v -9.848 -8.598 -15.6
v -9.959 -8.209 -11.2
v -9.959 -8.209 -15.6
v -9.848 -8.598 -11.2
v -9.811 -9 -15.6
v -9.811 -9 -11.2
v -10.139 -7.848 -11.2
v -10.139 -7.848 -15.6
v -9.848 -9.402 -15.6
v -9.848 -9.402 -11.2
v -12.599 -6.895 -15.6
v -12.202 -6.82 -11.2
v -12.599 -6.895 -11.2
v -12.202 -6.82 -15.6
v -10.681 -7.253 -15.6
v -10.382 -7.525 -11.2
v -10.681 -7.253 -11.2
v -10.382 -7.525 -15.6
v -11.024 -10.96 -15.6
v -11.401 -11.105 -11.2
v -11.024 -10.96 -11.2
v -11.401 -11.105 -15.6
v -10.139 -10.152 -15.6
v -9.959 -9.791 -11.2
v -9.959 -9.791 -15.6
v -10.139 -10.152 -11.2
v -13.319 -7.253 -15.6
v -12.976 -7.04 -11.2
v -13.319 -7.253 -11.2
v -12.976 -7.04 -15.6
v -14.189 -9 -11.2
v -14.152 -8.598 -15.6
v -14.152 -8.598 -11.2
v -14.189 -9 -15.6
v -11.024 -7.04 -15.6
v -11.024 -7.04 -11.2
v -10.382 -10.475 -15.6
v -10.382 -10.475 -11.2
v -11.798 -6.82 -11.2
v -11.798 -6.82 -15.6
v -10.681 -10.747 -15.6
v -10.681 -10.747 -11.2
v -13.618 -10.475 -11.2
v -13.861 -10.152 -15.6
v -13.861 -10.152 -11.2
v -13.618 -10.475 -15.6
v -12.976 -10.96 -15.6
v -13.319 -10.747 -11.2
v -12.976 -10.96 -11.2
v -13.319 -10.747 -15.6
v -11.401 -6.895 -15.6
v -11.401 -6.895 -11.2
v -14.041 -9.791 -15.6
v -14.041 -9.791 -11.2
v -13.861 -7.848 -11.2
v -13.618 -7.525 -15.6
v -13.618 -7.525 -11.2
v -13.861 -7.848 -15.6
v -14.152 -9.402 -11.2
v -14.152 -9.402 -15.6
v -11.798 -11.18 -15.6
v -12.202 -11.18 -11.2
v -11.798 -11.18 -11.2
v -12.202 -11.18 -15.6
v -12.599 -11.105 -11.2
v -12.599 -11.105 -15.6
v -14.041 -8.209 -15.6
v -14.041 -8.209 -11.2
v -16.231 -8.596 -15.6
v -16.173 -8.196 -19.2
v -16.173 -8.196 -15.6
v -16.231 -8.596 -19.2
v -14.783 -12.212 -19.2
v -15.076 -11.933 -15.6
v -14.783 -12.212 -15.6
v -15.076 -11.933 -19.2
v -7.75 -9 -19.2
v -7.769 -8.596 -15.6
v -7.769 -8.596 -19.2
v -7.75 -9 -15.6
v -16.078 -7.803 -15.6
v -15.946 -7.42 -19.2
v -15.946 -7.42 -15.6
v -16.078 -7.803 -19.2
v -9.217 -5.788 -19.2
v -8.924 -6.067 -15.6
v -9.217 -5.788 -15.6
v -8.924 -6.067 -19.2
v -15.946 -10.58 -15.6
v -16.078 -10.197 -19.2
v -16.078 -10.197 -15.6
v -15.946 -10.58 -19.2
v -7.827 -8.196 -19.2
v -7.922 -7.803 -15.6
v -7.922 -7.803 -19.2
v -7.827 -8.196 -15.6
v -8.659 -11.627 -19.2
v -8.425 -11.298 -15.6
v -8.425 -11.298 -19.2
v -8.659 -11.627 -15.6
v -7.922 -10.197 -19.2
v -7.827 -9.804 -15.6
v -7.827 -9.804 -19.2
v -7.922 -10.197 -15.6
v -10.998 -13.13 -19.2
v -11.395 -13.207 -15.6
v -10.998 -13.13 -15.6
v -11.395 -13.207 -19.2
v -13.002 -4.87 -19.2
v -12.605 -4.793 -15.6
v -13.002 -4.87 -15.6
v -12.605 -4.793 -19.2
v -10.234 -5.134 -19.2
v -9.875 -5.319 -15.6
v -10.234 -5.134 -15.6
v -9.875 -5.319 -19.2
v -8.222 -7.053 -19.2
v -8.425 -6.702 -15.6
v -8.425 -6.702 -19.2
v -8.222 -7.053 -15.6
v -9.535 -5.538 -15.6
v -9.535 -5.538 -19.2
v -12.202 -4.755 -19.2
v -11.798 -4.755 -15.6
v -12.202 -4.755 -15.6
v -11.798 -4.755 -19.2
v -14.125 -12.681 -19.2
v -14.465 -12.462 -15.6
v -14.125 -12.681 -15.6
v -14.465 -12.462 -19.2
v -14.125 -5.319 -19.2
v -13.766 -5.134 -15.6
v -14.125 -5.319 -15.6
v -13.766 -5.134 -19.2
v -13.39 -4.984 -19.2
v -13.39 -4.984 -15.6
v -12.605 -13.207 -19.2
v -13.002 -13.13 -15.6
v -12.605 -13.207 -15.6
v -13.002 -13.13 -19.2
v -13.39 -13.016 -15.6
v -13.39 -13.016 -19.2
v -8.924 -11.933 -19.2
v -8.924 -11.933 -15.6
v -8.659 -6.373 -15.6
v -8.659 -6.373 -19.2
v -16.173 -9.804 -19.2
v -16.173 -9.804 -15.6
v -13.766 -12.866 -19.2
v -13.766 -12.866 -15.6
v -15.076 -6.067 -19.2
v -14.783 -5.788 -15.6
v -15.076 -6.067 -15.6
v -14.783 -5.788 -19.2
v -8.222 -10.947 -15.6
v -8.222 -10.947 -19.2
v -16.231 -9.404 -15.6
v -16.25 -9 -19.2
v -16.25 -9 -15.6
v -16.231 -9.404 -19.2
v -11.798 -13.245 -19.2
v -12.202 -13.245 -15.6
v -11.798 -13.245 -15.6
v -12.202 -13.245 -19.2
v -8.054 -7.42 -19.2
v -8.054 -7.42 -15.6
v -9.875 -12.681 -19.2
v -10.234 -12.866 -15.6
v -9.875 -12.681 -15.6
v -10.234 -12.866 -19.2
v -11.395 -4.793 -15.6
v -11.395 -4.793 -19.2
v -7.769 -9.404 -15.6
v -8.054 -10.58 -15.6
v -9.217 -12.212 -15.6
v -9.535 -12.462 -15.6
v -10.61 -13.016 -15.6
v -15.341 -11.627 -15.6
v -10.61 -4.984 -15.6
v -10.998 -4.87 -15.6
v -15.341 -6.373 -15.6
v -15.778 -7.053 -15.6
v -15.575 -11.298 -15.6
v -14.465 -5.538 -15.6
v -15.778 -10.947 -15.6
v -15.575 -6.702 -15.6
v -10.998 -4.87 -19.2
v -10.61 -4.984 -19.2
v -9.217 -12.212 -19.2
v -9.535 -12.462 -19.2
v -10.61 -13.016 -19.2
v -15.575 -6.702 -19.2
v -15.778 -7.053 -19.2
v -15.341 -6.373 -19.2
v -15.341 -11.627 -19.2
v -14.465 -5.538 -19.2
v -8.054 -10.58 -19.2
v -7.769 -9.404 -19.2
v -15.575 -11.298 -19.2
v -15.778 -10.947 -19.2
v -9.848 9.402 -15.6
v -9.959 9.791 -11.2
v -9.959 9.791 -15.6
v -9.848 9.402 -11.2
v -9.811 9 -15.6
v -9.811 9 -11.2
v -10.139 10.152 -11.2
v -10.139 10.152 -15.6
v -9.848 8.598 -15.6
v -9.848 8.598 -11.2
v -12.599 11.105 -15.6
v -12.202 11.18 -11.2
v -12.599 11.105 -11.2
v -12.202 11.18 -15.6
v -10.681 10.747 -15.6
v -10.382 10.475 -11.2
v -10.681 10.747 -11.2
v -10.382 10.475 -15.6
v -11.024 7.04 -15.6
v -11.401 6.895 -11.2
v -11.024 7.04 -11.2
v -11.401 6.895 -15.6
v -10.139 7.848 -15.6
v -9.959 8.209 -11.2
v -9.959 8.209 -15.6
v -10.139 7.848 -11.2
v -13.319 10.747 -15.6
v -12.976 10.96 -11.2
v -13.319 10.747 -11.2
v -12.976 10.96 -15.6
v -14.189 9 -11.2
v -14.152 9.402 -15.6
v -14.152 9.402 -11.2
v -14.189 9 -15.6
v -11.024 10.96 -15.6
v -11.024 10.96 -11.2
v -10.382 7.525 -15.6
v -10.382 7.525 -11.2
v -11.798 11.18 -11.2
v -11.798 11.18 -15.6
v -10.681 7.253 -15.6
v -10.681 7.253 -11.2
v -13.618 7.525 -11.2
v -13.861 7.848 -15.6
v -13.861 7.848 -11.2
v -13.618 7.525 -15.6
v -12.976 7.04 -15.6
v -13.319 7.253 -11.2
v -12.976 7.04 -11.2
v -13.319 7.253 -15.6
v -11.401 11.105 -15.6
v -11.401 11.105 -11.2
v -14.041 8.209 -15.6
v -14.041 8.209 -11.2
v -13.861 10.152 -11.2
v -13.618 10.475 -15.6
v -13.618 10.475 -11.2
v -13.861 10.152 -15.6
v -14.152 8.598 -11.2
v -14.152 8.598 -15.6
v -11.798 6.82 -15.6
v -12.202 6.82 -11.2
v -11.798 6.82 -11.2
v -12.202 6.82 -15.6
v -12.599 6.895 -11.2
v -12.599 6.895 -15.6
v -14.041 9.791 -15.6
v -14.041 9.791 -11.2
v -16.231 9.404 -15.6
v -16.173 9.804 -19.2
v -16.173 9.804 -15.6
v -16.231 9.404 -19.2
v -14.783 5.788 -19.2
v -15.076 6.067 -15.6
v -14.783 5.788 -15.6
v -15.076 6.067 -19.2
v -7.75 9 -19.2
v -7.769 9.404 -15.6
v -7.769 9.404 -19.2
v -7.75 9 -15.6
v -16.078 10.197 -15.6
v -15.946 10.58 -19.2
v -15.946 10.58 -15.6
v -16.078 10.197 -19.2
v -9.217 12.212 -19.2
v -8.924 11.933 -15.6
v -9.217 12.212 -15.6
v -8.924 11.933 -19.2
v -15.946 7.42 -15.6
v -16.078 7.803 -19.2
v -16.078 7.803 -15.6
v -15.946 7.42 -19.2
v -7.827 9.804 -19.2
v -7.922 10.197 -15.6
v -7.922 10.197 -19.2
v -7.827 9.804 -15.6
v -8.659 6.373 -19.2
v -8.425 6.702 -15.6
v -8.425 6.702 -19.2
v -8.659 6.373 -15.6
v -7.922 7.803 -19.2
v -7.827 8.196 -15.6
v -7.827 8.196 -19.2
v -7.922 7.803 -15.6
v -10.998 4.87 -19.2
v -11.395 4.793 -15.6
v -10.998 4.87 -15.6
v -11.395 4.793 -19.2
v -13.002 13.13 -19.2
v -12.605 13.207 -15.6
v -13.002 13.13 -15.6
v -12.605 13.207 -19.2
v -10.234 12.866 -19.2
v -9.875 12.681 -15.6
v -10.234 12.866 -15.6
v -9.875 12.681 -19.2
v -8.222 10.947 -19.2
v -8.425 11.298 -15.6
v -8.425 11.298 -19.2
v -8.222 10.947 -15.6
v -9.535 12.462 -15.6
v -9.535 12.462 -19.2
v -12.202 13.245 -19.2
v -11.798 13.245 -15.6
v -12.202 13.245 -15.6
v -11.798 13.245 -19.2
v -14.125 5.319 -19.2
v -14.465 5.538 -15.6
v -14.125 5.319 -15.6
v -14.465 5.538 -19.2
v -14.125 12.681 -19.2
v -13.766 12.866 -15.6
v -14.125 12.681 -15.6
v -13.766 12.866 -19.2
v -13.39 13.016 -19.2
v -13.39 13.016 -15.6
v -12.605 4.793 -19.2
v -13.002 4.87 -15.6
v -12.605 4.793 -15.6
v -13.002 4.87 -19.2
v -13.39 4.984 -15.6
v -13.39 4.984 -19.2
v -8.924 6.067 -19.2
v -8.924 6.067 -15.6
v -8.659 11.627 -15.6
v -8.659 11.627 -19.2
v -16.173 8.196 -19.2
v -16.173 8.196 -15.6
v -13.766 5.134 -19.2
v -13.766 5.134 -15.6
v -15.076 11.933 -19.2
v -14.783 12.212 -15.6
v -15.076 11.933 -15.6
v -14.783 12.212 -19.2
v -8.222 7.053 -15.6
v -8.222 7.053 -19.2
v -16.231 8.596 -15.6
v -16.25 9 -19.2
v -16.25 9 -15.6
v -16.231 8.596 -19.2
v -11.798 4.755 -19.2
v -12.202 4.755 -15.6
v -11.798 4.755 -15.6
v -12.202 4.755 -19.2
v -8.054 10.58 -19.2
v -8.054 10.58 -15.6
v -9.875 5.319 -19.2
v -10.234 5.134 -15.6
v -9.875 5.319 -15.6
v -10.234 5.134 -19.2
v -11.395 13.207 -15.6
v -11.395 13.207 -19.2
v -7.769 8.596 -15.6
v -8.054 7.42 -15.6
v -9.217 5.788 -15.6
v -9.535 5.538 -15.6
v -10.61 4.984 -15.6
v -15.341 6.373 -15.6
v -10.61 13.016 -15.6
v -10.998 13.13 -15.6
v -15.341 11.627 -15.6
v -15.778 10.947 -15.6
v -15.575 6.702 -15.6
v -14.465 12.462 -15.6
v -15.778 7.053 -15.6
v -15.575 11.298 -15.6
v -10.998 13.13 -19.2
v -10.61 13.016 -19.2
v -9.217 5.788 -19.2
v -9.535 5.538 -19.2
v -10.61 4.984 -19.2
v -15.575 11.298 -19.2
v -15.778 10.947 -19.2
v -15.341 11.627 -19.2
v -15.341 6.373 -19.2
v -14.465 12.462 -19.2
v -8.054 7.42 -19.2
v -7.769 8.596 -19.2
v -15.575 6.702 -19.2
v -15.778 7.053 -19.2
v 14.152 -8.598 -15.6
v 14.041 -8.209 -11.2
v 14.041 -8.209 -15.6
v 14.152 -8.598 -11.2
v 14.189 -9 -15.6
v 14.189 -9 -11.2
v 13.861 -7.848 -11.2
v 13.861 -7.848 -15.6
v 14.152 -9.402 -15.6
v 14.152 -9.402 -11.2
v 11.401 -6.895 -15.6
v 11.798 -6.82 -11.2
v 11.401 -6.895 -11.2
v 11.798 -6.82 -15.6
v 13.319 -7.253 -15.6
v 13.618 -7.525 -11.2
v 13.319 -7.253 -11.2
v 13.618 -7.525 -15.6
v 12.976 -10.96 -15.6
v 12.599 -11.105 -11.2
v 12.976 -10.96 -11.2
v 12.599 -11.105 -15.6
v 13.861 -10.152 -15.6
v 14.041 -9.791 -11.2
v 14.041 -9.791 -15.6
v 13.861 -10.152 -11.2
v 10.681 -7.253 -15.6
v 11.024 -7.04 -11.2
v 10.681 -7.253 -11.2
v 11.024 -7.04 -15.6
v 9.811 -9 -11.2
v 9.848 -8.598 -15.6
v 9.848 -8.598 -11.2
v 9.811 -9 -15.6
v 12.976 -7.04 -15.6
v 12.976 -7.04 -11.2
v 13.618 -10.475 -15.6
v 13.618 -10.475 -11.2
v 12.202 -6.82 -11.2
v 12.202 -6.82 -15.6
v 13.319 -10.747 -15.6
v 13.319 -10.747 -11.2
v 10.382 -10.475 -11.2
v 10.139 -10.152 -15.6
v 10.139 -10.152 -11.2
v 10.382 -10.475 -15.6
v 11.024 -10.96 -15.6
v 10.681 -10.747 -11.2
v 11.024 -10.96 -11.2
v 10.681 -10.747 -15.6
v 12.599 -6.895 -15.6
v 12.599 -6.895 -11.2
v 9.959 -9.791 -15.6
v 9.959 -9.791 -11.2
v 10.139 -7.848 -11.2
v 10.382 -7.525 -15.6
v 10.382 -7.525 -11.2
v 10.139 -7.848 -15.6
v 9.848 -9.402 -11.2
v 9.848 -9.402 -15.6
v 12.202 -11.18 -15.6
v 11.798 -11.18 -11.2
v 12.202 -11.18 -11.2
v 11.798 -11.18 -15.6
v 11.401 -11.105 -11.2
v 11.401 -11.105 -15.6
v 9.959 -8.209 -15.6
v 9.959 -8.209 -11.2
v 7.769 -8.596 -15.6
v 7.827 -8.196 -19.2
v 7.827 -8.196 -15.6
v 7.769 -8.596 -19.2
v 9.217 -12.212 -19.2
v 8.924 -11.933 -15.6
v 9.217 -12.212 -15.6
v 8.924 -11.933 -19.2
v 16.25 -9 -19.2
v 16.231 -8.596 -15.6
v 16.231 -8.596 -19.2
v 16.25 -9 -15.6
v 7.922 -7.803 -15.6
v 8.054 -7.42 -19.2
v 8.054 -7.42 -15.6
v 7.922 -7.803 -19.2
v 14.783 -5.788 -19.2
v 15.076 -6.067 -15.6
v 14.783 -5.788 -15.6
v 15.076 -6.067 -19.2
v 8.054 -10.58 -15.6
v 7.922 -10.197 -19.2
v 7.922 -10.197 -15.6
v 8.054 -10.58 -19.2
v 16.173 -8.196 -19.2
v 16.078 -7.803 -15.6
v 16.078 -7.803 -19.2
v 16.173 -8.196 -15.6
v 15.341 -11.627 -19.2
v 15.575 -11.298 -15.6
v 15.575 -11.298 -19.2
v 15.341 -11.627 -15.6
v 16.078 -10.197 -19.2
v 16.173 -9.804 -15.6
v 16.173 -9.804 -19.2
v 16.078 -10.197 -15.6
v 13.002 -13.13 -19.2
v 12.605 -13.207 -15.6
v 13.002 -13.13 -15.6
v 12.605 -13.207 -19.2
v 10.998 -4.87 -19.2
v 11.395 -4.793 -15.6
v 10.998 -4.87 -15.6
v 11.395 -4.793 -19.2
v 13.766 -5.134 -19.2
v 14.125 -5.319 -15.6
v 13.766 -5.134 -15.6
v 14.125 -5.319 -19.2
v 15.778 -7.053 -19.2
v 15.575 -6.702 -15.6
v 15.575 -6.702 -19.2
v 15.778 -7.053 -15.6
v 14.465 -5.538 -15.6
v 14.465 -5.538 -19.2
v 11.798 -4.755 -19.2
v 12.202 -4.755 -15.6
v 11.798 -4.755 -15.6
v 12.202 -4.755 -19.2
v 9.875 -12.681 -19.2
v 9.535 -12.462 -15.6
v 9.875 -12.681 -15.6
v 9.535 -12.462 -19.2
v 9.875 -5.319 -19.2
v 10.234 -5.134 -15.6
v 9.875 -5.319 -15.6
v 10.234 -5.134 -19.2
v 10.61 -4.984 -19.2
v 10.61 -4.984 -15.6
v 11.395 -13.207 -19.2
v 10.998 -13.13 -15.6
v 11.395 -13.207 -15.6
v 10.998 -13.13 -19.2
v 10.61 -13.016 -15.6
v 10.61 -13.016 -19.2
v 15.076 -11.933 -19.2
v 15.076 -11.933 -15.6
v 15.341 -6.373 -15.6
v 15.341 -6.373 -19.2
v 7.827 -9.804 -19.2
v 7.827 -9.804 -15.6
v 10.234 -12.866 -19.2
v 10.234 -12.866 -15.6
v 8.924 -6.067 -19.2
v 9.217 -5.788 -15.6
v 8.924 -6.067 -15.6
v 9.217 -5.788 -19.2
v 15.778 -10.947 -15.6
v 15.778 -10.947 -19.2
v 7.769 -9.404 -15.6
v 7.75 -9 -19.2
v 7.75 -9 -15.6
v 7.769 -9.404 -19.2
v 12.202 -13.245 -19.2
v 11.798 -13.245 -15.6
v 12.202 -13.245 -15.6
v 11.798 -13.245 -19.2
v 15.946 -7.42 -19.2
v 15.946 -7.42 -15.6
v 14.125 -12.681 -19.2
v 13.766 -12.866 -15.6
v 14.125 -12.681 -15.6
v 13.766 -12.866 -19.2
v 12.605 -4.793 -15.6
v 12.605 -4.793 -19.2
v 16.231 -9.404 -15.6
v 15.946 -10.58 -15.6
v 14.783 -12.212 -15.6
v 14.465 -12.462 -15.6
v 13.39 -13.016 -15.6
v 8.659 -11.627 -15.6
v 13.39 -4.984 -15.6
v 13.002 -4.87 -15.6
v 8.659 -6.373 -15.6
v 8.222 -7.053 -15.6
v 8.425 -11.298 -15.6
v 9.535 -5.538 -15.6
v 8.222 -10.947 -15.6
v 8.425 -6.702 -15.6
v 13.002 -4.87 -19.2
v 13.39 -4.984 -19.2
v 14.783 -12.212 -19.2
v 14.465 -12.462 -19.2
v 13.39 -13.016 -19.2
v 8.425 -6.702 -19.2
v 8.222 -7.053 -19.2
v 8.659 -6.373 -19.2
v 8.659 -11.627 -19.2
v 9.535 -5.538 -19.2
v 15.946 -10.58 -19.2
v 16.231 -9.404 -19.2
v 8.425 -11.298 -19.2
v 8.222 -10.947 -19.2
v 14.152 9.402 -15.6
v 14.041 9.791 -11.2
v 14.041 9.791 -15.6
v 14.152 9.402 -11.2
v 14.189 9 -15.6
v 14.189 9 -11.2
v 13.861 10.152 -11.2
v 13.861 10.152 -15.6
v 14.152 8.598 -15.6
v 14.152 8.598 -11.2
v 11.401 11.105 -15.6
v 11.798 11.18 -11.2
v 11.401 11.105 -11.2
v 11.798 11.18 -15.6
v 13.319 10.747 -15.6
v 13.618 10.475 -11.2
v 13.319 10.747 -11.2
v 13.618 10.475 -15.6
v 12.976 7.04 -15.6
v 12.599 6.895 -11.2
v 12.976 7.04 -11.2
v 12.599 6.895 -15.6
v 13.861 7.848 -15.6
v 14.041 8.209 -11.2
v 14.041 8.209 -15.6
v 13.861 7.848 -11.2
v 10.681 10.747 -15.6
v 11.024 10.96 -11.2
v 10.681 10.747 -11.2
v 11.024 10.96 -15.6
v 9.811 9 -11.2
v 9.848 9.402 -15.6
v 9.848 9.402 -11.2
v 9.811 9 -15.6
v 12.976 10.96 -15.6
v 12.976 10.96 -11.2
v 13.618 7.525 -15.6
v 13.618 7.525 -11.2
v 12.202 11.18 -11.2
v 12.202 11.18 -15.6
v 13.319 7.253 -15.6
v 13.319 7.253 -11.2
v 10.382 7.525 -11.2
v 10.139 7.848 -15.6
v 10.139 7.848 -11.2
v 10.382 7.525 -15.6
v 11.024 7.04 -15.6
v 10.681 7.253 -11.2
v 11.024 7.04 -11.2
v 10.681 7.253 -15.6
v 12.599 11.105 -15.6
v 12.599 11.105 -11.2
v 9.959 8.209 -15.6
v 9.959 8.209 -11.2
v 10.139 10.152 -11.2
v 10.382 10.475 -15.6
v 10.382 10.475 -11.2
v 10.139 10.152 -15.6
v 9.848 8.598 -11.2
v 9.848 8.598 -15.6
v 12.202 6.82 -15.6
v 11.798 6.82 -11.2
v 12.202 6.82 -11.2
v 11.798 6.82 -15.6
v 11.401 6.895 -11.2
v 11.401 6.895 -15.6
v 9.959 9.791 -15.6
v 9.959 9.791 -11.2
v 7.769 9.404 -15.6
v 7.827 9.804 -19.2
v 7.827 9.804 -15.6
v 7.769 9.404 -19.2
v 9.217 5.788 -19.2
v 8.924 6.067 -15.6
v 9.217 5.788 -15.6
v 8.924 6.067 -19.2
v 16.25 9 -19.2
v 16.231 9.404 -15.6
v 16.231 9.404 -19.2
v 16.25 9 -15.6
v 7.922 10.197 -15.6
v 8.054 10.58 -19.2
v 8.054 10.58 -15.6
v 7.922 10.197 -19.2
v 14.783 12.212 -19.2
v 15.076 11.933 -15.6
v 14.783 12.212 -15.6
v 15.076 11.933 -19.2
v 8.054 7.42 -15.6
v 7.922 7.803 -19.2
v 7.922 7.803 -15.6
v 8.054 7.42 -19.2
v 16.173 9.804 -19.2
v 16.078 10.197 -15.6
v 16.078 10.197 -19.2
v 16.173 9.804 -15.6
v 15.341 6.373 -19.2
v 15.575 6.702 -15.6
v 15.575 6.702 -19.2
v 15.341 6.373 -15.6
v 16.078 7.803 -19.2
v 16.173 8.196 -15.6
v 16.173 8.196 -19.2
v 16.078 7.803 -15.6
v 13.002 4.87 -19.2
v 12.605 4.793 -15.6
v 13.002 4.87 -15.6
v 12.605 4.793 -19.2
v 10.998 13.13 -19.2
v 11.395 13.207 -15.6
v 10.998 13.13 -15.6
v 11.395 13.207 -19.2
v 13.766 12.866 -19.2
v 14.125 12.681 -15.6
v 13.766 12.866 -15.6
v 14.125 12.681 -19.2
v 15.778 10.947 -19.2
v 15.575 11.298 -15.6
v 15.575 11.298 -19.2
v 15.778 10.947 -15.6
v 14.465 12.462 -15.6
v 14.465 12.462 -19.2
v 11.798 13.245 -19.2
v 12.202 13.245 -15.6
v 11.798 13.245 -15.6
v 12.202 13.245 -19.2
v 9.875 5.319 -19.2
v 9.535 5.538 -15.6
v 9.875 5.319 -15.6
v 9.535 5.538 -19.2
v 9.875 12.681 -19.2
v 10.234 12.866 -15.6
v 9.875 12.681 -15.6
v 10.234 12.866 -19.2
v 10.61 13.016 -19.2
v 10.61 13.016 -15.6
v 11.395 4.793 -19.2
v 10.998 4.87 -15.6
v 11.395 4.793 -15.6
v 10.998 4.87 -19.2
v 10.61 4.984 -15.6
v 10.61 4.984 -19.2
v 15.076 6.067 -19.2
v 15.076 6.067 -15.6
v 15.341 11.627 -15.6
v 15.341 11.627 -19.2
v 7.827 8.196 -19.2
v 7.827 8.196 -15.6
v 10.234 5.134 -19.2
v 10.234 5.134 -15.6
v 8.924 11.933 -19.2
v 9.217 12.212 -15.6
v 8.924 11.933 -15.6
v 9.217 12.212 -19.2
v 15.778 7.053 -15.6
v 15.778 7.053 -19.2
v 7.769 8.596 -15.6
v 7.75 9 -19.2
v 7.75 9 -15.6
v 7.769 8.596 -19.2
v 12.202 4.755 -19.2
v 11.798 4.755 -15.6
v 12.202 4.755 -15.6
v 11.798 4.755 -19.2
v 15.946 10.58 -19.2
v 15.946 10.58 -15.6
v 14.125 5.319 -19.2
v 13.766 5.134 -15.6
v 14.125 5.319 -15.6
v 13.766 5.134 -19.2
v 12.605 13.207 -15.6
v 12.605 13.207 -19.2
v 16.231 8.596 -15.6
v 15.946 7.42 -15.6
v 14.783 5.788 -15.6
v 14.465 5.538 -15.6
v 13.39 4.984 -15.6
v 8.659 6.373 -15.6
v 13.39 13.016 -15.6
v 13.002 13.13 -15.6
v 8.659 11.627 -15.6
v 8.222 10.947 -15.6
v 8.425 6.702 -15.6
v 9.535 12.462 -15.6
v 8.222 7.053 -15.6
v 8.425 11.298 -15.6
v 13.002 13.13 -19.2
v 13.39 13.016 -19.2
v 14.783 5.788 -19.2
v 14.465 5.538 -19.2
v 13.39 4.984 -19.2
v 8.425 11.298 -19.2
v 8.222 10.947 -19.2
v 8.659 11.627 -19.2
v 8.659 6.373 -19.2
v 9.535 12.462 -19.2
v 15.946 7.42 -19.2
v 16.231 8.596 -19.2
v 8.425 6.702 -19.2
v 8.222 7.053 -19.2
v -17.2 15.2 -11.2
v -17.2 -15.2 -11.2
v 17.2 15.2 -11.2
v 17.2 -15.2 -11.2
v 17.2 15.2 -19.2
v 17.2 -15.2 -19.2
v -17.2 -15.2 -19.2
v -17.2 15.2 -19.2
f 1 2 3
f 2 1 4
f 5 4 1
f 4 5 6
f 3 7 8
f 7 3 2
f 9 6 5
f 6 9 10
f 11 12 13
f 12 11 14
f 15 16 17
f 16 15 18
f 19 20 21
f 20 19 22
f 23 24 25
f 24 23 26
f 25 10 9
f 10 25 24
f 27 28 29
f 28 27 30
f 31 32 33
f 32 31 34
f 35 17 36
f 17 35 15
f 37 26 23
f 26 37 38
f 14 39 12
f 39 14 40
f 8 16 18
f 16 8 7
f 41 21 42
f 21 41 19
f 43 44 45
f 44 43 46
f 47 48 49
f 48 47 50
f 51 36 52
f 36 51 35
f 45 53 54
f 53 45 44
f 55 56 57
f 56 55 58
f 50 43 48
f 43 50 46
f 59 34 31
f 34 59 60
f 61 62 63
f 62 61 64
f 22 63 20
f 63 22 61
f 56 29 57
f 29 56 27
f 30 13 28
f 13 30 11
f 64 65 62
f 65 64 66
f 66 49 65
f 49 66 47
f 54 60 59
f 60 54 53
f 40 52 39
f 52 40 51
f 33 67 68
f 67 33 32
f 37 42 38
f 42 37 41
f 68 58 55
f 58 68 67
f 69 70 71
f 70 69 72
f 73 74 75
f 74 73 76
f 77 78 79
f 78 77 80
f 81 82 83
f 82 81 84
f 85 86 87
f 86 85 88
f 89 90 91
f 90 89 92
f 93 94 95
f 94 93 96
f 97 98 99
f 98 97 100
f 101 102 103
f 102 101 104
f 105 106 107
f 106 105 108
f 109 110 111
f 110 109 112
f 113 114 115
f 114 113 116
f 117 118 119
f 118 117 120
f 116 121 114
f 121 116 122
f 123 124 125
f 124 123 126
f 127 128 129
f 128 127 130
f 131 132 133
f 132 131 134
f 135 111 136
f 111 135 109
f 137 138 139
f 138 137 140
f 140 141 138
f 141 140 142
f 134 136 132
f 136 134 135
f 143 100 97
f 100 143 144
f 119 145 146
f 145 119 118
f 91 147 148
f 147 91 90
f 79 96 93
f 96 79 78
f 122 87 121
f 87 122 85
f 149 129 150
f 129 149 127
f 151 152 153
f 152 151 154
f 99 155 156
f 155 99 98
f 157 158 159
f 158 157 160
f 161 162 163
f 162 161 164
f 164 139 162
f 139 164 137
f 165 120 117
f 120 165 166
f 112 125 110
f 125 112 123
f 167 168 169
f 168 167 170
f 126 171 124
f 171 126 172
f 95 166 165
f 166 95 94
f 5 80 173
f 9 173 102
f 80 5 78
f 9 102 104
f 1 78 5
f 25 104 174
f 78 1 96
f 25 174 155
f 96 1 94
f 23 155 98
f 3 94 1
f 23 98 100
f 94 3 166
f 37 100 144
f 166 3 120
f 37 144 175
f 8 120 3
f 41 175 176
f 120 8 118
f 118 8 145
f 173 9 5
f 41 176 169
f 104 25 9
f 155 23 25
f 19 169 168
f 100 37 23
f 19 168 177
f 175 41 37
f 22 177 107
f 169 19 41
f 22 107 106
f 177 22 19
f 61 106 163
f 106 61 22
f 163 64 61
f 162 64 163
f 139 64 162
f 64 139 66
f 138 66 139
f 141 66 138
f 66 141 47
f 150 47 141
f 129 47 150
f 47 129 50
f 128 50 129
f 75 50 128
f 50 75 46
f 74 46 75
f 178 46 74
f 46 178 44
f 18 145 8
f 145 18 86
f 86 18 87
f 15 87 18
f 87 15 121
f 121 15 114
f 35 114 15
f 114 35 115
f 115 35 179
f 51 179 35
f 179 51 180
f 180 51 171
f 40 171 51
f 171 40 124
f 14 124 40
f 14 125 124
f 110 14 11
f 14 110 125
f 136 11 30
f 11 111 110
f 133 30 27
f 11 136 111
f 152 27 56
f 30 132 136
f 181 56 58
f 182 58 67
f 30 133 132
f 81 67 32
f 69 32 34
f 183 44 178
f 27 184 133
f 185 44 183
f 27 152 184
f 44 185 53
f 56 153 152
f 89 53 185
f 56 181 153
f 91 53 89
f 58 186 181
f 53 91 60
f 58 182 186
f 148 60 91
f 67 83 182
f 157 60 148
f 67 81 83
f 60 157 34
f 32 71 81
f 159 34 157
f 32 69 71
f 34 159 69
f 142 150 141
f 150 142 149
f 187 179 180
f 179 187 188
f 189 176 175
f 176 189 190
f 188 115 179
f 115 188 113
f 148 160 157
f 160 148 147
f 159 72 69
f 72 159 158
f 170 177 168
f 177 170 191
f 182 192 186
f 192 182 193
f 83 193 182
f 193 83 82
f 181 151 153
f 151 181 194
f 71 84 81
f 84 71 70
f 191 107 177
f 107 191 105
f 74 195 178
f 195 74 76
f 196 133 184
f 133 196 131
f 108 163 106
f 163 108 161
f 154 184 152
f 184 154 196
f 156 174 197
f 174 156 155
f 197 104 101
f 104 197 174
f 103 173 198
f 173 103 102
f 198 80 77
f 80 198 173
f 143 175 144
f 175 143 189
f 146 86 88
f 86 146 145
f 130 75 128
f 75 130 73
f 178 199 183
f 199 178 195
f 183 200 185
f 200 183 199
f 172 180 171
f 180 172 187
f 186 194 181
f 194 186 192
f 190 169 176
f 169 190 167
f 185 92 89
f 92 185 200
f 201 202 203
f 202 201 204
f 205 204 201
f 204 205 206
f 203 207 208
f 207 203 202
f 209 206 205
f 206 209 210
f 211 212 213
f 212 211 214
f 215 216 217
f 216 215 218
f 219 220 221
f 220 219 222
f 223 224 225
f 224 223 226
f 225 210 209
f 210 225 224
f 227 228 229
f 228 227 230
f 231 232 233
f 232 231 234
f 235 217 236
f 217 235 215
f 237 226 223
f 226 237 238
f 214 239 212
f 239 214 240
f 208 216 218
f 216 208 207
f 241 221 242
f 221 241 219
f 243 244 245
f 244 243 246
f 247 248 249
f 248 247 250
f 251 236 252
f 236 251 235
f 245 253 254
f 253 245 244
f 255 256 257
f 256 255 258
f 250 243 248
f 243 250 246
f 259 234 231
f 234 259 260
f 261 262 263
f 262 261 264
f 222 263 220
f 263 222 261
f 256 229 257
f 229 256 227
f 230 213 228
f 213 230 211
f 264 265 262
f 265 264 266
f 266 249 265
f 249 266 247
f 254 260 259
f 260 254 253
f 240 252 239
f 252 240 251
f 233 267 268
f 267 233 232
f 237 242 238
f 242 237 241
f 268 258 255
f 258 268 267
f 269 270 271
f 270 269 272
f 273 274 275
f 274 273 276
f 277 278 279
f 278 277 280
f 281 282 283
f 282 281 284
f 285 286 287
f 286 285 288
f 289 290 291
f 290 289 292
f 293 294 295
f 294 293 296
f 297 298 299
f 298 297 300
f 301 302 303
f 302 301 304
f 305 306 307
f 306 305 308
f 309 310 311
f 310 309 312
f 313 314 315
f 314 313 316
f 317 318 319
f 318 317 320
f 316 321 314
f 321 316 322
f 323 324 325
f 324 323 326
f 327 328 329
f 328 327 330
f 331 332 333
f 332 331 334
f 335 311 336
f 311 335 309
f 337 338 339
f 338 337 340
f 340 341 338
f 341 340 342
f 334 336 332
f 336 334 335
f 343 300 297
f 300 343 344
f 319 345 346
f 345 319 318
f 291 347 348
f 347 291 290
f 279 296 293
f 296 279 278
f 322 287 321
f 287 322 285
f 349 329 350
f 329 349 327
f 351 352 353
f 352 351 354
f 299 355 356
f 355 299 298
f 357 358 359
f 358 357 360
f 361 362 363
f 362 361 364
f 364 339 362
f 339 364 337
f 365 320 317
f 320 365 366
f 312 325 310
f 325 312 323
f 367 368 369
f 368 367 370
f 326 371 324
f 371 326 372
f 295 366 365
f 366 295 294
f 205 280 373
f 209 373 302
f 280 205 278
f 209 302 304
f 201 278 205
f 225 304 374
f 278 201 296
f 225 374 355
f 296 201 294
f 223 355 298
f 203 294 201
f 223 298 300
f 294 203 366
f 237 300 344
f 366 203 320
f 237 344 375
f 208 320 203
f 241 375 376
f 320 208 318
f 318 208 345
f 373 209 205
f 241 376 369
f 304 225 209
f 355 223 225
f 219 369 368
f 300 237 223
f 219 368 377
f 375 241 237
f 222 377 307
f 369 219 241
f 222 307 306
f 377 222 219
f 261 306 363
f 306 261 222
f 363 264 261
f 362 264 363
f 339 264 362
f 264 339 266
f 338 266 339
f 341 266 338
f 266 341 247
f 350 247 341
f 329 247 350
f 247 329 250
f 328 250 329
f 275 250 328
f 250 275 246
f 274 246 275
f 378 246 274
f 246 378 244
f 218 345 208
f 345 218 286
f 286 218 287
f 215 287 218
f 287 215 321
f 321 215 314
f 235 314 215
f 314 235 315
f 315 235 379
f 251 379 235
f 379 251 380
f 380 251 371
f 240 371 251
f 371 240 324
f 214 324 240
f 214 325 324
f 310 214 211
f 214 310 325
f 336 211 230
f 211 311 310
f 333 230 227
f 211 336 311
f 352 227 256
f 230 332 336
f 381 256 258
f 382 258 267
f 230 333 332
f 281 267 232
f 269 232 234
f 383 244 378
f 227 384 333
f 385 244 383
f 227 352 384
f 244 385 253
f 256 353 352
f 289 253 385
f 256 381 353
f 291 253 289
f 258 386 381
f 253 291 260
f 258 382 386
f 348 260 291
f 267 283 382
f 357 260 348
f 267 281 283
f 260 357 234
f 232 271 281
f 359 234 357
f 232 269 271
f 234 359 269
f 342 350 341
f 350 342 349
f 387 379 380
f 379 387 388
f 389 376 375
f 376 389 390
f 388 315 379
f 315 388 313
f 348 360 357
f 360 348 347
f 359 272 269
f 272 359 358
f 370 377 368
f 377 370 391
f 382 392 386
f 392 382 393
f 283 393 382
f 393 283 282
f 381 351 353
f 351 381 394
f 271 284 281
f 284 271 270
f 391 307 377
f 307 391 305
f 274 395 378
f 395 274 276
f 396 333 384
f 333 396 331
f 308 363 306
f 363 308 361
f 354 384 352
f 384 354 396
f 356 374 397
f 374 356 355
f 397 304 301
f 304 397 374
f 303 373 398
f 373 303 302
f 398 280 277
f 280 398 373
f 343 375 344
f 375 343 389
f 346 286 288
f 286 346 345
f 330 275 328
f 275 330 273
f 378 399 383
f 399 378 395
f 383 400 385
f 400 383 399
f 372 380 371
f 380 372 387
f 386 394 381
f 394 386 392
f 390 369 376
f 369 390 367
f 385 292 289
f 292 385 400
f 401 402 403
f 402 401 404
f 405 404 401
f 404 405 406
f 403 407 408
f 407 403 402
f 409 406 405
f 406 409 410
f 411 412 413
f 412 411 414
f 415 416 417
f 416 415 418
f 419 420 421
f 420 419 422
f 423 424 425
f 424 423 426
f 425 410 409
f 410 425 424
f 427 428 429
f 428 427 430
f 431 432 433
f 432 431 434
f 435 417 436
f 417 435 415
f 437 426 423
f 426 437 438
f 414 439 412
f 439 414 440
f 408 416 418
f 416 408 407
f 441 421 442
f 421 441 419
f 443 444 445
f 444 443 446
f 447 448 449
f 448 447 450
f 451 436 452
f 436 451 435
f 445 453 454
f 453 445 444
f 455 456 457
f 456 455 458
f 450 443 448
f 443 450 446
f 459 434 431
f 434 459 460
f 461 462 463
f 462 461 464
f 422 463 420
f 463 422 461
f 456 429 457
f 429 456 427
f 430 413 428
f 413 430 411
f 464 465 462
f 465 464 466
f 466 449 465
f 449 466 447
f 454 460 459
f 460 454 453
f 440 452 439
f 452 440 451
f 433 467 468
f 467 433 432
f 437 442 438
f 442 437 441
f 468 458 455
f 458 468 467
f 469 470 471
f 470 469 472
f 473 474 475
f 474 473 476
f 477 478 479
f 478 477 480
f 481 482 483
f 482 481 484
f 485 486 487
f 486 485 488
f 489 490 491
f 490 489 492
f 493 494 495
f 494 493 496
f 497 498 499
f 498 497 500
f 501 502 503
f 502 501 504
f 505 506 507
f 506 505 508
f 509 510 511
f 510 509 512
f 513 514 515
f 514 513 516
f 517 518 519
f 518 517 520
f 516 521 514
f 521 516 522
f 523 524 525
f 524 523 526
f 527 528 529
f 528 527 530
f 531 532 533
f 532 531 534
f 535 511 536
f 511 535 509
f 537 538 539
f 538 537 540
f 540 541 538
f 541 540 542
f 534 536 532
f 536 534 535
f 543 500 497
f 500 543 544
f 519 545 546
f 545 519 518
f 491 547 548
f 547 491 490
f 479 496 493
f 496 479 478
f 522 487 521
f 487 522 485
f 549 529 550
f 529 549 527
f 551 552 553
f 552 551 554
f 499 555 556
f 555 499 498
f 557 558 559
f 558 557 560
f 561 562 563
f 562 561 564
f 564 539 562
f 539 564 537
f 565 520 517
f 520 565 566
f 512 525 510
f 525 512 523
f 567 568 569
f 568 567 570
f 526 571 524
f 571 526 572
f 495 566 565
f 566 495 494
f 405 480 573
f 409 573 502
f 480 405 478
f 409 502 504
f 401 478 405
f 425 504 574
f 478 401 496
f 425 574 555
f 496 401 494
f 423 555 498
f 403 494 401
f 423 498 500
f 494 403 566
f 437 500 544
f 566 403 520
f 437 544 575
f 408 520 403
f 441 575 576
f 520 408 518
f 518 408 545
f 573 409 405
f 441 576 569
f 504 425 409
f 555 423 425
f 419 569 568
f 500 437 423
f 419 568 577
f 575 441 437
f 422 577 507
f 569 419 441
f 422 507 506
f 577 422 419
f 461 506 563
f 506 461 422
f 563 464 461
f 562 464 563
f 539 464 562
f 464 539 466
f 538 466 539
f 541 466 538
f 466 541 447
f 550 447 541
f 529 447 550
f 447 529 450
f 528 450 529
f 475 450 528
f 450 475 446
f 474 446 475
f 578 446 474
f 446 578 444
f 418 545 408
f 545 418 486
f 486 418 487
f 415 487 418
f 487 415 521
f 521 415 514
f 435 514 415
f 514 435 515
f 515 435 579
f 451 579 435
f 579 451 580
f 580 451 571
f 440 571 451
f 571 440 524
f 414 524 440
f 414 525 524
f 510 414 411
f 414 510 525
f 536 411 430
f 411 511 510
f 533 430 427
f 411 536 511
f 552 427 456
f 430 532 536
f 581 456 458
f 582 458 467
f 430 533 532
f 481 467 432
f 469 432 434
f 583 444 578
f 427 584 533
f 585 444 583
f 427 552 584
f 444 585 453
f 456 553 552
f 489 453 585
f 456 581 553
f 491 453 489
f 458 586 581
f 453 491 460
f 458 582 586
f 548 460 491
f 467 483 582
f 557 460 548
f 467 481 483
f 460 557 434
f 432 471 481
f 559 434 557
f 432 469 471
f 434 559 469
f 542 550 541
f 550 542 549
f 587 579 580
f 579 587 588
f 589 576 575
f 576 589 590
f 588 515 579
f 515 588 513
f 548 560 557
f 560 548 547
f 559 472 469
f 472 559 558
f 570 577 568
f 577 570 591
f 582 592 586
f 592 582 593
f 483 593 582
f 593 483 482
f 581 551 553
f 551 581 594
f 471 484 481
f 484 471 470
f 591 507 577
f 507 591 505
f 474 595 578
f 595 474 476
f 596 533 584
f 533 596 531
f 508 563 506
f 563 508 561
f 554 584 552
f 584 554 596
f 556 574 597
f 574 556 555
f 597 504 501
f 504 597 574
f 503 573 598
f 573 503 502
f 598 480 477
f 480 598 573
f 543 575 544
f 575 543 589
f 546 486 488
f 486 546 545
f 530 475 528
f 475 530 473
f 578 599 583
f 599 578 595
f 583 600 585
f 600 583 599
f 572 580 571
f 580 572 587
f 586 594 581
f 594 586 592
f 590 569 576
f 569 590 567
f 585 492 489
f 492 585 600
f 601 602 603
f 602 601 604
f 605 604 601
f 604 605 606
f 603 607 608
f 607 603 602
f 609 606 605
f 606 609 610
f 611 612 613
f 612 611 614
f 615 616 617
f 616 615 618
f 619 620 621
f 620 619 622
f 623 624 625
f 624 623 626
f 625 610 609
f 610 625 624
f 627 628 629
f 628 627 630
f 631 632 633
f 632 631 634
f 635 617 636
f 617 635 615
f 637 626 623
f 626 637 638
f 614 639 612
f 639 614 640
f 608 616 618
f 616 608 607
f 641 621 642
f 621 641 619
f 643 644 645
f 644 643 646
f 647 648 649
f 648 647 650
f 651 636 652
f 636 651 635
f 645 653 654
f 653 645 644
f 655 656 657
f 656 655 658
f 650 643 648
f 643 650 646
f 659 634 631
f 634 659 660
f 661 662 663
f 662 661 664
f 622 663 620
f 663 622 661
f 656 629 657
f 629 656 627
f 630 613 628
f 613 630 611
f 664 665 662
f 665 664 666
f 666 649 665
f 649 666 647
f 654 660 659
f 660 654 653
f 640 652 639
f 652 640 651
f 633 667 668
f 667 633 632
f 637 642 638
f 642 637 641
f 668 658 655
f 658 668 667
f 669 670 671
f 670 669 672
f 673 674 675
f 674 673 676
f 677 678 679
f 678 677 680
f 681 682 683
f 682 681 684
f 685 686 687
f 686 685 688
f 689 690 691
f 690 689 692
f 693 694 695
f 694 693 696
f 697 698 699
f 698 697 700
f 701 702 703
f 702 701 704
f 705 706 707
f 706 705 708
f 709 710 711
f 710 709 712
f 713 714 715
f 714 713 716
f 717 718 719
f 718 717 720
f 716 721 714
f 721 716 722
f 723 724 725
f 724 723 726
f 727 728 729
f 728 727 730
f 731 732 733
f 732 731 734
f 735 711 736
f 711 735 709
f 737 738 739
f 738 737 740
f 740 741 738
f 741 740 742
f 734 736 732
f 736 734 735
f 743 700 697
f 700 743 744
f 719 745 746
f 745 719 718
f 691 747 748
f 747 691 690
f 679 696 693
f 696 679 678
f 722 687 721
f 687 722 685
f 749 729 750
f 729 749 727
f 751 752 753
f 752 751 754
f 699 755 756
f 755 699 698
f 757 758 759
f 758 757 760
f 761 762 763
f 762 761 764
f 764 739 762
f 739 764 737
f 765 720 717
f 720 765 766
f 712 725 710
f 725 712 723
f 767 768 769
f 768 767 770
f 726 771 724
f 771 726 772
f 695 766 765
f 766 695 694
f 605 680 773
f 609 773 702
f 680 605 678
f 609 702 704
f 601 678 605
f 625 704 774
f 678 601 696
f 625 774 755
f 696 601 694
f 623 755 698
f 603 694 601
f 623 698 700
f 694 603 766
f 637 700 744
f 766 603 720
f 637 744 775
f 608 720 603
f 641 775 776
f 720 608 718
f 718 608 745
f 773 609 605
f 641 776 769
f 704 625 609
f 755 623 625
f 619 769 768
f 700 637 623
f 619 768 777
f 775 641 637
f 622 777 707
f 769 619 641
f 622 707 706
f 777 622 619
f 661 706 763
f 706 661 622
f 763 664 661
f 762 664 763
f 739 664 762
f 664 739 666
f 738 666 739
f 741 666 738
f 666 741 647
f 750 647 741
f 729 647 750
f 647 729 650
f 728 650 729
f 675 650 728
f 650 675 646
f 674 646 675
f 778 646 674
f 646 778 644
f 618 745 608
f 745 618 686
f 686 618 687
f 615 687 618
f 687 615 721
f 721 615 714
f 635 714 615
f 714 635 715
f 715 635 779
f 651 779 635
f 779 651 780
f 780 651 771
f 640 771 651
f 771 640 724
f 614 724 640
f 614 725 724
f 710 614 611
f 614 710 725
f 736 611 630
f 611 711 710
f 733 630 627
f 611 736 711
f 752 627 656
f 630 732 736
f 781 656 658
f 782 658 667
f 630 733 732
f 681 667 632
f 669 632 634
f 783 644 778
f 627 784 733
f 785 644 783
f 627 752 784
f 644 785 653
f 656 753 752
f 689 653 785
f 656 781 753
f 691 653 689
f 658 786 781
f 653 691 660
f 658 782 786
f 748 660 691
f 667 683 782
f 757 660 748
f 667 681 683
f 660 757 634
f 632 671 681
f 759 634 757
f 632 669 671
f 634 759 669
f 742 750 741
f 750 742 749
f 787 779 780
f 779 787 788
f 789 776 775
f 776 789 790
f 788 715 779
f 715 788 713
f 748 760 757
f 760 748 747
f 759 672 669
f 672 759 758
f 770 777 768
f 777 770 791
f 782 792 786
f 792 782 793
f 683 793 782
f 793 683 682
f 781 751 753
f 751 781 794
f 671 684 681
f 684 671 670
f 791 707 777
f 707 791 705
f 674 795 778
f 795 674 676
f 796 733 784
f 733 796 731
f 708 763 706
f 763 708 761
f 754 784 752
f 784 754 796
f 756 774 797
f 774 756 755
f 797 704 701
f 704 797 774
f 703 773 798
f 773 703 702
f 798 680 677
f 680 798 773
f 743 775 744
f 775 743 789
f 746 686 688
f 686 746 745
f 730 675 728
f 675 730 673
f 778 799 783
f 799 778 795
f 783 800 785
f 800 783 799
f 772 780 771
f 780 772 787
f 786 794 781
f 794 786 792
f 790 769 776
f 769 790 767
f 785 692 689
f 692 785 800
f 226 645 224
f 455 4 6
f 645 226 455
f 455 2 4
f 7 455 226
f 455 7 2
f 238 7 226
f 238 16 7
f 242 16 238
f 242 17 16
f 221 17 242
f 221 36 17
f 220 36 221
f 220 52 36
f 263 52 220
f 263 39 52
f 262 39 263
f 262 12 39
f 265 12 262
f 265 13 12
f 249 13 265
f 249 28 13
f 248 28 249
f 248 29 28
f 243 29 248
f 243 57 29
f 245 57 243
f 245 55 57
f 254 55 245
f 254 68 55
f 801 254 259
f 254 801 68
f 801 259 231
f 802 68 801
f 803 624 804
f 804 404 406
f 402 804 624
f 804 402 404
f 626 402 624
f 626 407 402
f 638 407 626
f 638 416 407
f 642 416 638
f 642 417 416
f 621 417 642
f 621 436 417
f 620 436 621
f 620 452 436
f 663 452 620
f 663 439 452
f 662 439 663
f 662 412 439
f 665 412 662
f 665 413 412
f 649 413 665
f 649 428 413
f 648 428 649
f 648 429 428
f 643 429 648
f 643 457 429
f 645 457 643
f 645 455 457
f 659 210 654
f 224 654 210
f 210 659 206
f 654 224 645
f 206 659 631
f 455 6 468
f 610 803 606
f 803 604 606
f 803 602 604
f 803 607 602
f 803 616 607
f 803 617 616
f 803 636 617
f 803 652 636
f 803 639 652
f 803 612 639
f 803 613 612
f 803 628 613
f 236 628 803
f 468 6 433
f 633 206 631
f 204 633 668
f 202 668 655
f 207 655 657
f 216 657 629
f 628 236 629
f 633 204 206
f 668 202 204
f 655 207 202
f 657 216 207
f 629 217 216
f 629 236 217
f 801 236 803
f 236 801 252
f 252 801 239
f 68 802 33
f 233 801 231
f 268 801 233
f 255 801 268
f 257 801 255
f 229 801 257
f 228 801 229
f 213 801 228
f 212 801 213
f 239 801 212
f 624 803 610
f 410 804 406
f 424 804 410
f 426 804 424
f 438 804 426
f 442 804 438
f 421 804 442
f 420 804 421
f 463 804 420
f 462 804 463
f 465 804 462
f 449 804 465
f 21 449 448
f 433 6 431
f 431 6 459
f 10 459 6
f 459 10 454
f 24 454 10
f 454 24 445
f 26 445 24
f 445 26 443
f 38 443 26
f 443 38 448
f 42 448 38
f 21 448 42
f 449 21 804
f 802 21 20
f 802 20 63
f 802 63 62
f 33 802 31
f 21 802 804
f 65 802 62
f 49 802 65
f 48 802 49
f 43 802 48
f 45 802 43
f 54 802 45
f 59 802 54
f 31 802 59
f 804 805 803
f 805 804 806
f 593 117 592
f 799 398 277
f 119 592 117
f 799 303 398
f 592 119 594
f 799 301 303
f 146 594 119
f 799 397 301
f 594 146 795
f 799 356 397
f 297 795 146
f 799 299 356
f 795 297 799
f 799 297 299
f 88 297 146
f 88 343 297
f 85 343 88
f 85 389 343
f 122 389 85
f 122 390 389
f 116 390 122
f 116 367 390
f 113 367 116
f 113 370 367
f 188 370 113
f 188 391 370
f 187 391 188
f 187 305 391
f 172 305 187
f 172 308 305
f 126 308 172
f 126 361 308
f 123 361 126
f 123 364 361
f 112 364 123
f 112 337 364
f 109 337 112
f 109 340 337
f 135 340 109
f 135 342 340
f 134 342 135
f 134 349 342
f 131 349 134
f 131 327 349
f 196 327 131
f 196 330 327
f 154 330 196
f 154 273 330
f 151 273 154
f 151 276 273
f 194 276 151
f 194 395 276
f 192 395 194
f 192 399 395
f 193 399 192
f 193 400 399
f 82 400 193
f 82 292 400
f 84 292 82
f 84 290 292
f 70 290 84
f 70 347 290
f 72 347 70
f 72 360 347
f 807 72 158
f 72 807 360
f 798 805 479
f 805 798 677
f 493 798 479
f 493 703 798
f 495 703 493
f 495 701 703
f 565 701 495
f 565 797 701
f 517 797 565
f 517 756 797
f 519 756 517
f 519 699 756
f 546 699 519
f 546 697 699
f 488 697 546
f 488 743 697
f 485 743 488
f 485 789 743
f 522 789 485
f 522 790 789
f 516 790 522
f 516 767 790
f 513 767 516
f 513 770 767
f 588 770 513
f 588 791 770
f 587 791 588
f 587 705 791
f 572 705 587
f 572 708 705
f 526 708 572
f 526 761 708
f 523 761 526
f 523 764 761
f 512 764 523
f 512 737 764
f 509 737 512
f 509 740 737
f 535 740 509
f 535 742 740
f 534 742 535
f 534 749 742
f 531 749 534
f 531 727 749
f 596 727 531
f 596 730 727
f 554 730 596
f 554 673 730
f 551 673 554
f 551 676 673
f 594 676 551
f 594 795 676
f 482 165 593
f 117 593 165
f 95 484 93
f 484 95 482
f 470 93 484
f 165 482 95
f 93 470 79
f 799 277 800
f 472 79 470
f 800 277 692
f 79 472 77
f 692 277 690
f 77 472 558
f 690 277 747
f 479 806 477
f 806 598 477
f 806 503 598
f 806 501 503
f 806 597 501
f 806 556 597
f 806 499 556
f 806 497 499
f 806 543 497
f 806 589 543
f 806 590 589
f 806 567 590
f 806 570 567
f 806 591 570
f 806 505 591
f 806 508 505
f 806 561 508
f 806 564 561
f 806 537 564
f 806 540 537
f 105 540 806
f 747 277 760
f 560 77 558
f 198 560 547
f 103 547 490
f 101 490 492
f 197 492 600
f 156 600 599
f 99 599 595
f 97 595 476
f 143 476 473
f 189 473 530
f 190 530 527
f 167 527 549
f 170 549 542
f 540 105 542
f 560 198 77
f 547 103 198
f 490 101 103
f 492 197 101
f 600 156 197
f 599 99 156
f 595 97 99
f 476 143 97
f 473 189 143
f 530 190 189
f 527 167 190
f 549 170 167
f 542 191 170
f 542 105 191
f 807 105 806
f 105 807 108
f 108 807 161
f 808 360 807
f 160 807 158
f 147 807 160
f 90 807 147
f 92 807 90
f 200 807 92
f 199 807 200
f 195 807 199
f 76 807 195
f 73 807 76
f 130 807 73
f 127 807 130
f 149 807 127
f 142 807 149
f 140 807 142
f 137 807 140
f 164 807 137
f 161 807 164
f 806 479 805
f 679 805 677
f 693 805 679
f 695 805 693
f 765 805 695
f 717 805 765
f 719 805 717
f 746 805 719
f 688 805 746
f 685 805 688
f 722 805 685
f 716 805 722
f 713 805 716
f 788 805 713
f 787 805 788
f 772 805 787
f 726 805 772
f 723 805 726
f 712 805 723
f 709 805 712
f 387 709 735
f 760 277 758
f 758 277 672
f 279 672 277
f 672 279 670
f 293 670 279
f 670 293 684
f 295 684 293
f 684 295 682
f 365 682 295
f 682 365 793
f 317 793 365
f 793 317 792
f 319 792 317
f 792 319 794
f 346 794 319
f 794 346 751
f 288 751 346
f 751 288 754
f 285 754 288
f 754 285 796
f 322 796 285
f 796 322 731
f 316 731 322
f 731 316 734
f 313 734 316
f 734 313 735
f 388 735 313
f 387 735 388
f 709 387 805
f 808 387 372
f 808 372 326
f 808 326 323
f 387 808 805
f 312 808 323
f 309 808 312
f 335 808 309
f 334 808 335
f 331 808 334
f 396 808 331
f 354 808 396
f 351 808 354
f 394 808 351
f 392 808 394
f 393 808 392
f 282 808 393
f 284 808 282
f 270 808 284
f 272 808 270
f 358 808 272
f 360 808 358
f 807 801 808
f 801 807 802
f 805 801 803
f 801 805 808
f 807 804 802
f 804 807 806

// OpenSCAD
difference() {
  // attachment
  // volume
  translate(v=[0, 0, -15.2])
  cube(size=[34.4, 30.4, 8.0], center=true);
  // bearing
  union() {
    // base
    // volume
    cube(size=[34.4, 30.4, 22.4], center=true);
    // bolts
    union() {
      translate(v=[-12.0, -9.0, -10.62])
      union() {
        // thread
        cylinder(h=10, d=4.378, $fn=34, center=true);
        // head
        translate(v=[0, 0, -6.78])
        cylinder(h=3.6, d=8.5, $fn=66, center=true);
        // head_clearance
        translate(v=[0, 0, -58.56])
        cylinder(h=100, d=8.5, $fn=66, center=true);
      }
      translate(v=[-12.0, 9.0, -10.62])
      union() {
        // thread
        cylinder(h=10, d=4.378, $fn=34, center=true);
        // head
        translate(v=[0, 0, -6.78])
        cylinder(h=3.6, d=8.5, $fn=66, center=true);
        // head_clearance
        translate(v=[0, 0, -58.56])
        cylinder(h=100, d=8.5, $fn=66, center=true);
      }
      translate(v=[12.0, -9.0, -10.62])
      union() {
        // thread
        cylinder(h=10, d=4.378, $fn=34, center=true);
        // head
        translate(v=[0, 0, -6.78])
        cylinder(h=3.6, d=8.5, $fn=66, center=true);
        // head_clearance
        translate(v=[0, 0, -58.56])
        cylinder(h=100, d=8.5, $fn=66, center=true);
      }
      translate(v=[12.0, 9.0, -10.62])
      union() {
        // thread
        cylinder(h=10, d=4.378, $fn=34, center=true);
        // head
        translate(v=[0, 0, -6.78])
        cylinder(h=3.6, d=8.5, $fn=66, center=true);
        // head_clearance
        translate(v=[0, 0, -58.56])
        cylinder(h=100, d=8.5, $fn=66, center=true);
      }
    }
  }
}
